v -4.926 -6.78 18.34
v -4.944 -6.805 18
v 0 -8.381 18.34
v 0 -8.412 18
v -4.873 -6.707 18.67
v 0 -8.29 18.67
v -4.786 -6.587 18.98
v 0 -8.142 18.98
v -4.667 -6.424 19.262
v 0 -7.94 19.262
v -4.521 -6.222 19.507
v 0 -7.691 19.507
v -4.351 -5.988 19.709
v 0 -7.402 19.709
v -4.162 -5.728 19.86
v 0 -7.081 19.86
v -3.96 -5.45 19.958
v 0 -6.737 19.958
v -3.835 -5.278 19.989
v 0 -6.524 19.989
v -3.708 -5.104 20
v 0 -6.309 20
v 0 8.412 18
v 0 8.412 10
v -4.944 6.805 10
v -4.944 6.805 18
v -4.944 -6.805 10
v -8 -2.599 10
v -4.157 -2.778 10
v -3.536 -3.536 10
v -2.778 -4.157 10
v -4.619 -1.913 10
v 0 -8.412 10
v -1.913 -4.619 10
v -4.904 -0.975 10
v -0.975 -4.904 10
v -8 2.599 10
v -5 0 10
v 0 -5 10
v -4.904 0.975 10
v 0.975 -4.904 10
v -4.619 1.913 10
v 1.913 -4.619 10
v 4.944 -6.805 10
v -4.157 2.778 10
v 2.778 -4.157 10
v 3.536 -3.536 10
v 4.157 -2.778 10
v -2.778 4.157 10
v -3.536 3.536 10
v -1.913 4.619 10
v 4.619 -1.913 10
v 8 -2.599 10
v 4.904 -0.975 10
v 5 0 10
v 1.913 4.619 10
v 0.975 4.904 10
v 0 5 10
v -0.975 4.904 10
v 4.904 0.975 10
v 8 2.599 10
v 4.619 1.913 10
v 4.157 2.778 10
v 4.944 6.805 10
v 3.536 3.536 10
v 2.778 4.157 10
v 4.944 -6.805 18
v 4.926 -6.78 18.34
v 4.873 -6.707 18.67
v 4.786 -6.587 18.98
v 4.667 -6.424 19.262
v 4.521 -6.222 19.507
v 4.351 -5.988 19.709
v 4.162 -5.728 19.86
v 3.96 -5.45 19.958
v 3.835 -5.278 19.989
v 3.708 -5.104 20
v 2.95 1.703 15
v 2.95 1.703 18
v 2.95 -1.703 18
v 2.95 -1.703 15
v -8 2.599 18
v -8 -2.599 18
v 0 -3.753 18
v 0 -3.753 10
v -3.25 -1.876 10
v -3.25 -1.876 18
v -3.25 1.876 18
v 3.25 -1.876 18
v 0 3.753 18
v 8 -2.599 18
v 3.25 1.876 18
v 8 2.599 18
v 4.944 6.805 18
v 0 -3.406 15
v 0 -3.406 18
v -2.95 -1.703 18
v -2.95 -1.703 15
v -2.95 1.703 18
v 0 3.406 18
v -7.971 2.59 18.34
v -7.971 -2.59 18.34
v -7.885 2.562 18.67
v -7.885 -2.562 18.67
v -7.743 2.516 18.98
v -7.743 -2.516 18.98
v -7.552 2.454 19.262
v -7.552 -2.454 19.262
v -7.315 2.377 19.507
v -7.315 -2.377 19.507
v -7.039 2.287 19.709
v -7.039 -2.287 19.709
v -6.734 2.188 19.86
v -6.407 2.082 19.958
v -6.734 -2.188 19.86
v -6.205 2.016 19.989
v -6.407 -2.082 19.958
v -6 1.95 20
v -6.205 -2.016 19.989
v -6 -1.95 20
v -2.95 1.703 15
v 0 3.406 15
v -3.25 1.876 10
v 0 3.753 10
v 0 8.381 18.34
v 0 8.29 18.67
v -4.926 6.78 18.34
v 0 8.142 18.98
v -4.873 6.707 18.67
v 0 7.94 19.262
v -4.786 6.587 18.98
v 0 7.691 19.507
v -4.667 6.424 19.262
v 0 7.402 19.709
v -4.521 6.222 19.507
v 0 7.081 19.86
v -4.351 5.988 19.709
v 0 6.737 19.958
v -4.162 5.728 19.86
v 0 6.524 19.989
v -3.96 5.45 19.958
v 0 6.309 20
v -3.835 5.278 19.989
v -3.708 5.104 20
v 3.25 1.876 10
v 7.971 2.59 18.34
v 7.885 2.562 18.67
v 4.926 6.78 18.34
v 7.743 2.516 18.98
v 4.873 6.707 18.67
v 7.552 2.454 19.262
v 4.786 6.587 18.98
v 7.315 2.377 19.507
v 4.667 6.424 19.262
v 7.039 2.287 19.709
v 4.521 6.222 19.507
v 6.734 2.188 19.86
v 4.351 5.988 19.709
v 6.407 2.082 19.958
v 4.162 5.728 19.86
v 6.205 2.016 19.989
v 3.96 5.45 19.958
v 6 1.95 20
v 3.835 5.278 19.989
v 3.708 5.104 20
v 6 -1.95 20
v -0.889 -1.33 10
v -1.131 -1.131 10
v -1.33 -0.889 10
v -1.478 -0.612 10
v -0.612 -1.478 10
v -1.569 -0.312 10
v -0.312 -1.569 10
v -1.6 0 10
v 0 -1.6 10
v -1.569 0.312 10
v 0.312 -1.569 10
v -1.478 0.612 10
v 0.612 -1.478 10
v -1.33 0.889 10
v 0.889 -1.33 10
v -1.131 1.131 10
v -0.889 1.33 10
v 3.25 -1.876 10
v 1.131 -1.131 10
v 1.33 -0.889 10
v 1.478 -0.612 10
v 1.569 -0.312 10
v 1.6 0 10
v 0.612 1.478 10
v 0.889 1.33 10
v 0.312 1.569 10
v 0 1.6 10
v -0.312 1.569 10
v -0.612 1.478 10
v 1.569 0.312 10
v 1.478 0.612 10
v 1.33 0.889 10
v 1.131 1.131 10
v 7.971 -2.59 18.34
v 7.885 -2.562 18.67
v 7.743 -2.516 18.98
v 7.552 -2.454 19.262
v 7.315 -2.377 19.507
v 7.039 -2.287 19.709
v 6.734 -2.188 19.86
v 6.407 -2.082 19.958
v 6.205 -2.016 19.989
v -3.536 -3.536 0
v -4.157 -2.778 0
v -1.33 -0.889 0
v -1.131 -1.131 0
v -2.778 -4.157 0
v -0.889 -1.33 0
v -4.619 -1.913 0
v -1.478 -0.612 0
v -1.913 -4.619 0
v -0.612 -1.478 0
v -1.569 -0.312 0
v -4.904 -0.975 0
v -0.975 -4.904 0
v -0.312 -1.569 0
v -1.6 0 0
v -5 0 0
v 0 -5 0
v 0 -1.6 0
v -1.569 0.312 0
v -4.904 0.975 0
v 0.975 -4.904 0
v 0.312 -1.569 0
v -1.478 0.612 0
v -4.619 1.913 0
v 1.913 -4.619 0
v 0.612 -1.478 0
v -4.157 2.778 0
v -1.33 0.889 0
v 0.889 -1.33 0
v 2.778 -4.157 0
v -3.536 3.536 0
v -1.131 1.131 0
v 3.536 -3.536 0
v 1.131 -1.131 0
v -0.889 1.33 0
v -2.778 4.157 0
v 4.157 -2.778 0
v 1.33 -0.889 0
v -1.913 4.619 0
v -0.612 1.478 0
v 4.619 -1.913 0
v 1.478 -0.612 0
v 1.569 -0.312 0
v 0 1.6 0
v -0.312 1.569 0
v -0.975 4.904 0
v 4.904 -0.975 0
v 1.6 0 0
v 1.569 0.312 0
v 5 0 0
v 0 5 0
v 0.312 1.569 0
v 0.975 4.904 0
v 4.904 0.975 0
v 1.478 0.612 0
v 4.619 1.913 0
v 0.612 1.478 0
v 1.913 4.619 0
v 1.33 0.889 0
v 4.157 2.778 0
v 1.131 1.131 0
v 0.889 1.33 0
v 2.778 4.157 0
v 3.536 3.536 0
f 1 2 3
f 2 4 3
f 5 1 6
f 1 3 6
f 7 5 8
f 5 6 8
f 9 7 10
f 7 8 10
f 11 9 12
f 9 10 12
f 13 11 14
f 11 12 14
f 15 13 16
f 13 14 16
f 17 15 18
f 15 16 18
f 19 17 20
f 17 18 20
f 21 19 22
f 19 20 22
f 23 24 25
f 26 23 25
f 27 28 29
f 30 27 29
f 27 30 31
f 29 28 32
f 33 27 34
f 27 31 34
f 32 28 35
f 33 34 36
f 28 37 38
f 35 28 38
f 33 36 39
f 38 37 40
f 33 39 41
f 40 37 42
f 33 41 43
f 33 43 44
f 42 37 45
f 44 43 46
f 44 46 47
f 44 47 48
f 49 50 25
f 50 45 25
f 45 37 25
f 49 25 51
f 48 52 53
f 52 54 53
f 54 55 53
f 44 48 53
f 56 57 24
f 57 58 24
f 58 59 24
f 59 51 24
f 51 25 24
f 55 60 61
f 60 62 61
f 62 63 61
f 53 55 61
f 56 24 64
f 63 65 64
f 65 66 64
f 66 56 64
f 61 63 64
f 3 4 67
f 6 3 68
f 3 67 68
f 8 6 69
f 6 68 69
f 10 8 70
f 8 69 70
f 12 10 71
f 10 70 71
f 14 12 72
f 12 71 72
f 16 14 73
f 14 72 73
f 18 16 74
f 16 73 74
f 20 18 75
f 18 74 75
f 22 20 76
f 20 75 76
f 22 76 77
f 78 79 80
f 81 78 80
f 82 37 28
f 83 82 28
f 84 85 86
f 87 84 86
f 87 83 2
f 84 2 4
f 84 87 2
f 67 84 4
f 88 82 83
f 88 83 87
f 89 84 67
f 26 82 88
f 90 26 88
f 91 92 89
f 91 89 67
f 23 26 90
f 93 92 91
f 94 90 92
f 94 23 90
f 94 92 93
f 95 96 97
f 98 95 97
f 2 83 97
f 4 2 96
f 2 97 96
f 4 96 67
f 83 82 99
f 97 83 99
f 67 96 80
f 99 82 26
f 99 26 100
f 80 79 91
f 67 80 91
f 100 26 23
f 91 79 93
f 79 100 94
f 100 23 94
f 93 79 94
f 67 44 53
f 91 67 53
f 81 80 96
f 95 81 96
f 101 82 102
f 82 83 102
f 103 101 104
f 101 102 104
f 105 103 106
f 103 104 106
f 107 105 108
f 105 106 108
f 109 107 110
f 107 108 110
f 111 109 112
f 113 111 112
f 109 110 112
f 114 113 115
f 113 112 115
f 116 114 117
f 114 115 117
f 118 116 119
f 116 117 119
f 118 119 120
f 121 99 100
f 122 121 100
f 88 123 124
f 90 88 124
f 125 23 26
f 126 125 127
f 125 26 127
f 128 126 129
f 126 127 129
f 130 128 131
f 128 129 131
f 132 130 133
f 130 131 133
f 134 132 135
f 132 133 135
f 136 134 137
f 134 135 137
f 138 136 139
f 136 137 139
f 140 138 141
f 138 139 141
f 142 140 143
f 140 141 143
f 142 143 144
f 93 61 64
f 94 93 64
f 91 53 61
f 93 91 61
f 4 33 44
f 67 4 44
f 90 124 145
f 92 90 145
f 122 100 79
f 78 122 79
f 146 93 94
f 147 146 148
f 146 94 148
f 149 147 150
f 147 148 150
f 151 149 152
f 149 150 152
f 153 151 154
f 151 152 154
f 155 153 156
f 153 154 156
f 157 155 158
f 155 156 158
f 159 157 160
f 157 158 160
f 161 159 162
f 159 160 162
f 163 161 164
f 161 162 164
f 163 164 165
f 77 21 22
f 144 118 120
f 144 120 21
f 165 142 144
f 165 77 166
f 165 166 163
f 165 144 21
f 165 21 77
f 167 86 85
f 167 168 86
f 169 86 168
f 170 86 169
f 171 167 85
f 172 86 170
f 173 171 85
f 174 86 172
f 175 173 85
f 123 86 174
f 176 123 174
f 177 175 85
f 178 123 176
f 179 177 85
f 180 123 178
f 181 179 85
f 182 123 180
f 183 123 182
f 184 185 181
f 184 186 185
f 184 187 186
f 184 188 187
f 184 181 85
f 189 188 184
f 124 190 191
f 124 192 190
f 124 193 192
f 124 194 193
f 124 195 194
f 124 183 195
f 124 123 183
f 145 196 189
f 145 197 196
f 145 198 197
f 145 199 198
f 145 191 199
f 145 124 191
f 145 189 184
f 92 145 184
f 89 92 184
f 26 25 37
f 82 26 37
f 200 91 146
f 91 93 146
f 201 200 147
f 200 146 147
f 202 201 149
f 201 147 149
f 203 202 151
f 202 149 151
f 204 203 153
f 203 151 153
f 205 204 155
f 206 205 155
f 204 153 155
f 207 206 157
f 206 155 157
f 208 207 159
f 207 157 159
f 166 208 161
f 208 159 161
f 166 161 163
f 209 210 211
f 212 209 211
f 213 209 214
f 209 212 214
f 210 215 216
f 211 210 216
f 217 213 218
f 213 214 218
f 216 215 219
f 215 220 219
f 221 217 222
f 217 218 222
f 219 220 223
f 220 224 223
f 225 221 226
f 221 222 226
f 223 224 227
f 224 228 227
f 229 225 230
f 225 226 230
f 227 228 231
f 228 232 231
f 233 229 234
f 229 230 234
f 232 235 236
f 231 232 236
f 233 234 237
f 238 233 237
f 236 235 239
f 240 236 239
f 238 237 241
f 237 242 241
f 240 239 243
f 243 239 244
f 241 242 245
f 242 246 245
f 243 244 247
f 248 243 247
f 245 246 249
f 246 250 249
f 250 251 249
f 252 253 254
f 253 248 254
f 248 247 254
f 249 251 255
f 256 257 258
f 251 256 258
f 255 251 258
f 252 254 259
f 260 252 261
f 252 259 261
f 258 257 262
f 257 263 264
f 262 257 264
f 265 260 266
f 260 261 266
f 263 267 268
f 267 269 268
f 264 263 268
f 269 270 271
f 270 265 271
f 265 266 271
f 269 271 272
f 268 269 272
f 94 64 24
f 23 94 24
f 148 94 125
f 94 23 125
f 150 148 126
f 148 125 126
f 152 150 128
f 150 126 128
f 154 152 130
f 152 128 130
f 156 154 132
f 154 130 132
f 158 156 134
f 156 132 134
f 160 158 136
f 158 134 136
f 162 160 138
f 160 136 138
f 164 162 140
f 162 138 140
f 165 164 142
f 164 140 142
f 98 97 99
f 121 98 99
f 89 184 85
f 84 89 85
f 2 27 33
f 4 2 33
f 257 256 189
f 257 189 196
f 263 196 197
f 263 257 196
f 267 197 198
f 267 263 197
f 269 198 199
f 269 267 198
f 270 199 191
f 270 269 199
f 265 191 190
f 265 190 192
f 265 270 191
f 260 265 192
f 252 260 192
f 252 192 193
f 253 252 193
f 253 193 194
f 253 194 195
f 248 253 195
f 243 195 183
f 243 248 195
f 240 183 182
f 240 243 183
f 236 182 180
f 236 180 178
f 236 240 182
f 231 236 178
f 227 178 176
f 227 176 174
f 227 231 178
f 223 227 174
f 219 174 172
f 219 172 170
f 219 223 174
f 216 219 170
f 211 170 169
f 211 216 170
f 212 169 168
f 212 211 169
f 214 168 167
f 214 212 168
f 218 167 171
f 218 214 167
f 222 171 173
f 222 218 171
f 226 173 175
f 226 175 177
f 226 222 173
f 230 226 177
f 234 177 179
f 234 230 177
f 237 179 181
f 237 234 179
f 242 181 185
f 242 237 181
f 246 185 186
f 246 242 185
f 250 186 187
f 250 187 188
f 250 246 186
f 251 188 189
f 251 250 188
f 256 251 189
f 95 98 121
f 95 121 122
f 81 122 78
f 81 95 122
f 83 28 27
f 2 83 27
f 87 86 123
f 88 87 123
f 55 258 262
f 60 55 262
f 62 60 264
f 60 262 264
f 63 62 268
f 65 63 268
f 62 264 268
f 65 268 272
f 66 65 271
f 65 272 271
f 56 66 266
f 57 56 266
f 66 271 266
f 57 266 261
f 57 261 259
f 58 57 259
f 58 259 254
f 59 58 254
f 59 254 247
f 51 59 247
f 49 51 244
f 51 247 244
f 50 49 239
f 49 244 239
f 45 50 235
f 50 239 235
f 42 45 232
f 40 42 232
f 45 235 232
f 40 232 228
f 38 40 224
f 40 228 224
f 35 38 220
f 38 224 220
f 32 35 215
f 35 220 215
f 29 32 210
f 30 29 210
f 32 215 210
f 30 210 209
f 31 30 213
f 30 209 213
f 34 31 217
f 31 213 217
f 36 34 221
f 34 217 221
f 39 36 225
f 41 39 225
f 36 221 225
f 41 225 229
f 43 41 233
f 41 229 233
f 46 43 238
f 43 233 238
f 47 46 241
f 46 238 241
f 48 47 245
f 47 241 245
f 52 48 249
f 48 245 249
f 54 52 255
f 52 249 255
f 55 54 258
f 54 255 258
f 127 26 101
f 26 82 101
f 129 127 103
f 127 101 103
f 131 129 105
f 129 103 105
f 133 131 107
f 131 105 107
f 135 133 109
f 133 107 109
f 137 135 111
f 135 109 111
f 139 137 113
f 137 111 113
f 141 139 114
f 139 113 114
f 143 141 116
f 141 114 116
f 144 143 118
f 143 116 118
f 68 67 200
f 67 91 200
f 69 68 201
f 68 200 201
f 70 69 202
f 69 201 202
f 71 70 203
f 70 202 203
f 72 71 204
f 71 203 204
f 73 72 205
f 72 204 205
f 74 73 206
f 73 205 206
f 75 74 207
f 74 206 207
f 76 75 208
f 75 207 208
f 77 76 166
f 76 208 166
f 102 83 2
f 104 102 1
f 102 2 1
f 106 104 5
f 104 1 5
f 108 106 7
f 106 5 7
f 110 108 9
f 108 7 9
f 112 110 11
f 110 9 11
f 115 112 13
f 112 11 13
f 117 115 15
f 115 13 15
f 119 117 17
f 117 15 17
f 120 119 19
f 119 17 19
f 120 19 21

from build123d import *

# Parameters (mm, degrees)
F0_R     = 5
F0_R_2   = 1.6
F1_DEPTH = 10
F3_DEPTH = 8
F5_DEPTH = 2
F6_R     = 1.99999
F8_DEPTH = 3


# Not quite as in the source:
# - a fillet or chamfer is up to 0.001 mm smaller than in the source, because OpenCascade refuses the exact size


with BuildPart() as f1:
    # F0 (on Top) → F1 (new body)
    with BuildSketch(Plane.XY):
        Circle(F0_R)
        Circle(F0_R_2, mode=Mode.SUBTRACT)
    extrude(amount=F1_DEPTH)

    # F2 (on face) → F3 (join)
    with BuildSketch(Plane.XY.offset(10)):
        Polygon((8, -2.5993575699), (8, 2.5993575699), (4.94427191, 6.8052064668), (0, 8.4116977939), (-4.94427191, 6.8052064668), (-8, 2.5993575699), (-8, -2.5993575699), (-4.94427191, -6.8052064668), (0, -8.4116977939), (4.94427191, -6.8052064668), align=None)
        Polygon((0, 3.7527767497), (3.25, 1.8763883749), (3.25, -1.8763883749), (0, -3.7527767497), (-3.25, -1.8763883749), (-3.25, 1.8763883749), align=None, mode=Mode.SUBTRACT)
    extrude(amount=F3_DEPTH)


with BuildPart() as f5:
    # F4 (on face) → F5 (new body)
    with BuildSketch(Plane.XY.offset(18)):
        Polygon((0, 8.4116977939), (-4.94427191, 6.8052064668), (-8, 2.5993575699), (-8, -2.5993575699), (-4.94427191, -6.8052064668), (0, -8.4116977939), (4.94427191, -6.8052064668), (8, -2.5993575699), (8, 2.5993575699), (4.94427191, 6.8052064668), align=None)
    extrude(amount=F5_DEPTH)

    # F6 (radius 2 in the source; OpenCascade refuses exactly that, so slightly less here)
    f6_edges = [f5.edges().sort_by_distance(p)[0] for p in [
        (-2.472136, 7.608452, 20),
        (-6.472136, 4.702282, 20),
        (-8, 0, 20),
        (-6.472136, -4.702282, 20),
        (-2.472136, -7.608452, 20),
        (2.472136, -7.608452, 20),
        (6.472136, -4.702282, 20),
        (8, 0, 20),
        (6.472136, 4.702282, 20),
        (2.472136, 7.608452, 20),
    ]]
    fillet(f6_edges, radius=F6_R)

    # F7 (on face) → F8 (join)
    with BuildSketch(Plane(origin=(0, 0, 18), x_dir=(1, 0, 0), z_dir=(0, 0, -1))):
        Polygon((0, 3.406366662), (-2.9500000639, 1.703183331), (-2.9500000639, -1.703183331), (0, -3.406366662), (2.9500000639, -1.703183331), (2.9500000639, 1.703183331), align=None)
    extrude(amount=F8_DEPTH)


solid = Compound([f1.part, f5.part])
